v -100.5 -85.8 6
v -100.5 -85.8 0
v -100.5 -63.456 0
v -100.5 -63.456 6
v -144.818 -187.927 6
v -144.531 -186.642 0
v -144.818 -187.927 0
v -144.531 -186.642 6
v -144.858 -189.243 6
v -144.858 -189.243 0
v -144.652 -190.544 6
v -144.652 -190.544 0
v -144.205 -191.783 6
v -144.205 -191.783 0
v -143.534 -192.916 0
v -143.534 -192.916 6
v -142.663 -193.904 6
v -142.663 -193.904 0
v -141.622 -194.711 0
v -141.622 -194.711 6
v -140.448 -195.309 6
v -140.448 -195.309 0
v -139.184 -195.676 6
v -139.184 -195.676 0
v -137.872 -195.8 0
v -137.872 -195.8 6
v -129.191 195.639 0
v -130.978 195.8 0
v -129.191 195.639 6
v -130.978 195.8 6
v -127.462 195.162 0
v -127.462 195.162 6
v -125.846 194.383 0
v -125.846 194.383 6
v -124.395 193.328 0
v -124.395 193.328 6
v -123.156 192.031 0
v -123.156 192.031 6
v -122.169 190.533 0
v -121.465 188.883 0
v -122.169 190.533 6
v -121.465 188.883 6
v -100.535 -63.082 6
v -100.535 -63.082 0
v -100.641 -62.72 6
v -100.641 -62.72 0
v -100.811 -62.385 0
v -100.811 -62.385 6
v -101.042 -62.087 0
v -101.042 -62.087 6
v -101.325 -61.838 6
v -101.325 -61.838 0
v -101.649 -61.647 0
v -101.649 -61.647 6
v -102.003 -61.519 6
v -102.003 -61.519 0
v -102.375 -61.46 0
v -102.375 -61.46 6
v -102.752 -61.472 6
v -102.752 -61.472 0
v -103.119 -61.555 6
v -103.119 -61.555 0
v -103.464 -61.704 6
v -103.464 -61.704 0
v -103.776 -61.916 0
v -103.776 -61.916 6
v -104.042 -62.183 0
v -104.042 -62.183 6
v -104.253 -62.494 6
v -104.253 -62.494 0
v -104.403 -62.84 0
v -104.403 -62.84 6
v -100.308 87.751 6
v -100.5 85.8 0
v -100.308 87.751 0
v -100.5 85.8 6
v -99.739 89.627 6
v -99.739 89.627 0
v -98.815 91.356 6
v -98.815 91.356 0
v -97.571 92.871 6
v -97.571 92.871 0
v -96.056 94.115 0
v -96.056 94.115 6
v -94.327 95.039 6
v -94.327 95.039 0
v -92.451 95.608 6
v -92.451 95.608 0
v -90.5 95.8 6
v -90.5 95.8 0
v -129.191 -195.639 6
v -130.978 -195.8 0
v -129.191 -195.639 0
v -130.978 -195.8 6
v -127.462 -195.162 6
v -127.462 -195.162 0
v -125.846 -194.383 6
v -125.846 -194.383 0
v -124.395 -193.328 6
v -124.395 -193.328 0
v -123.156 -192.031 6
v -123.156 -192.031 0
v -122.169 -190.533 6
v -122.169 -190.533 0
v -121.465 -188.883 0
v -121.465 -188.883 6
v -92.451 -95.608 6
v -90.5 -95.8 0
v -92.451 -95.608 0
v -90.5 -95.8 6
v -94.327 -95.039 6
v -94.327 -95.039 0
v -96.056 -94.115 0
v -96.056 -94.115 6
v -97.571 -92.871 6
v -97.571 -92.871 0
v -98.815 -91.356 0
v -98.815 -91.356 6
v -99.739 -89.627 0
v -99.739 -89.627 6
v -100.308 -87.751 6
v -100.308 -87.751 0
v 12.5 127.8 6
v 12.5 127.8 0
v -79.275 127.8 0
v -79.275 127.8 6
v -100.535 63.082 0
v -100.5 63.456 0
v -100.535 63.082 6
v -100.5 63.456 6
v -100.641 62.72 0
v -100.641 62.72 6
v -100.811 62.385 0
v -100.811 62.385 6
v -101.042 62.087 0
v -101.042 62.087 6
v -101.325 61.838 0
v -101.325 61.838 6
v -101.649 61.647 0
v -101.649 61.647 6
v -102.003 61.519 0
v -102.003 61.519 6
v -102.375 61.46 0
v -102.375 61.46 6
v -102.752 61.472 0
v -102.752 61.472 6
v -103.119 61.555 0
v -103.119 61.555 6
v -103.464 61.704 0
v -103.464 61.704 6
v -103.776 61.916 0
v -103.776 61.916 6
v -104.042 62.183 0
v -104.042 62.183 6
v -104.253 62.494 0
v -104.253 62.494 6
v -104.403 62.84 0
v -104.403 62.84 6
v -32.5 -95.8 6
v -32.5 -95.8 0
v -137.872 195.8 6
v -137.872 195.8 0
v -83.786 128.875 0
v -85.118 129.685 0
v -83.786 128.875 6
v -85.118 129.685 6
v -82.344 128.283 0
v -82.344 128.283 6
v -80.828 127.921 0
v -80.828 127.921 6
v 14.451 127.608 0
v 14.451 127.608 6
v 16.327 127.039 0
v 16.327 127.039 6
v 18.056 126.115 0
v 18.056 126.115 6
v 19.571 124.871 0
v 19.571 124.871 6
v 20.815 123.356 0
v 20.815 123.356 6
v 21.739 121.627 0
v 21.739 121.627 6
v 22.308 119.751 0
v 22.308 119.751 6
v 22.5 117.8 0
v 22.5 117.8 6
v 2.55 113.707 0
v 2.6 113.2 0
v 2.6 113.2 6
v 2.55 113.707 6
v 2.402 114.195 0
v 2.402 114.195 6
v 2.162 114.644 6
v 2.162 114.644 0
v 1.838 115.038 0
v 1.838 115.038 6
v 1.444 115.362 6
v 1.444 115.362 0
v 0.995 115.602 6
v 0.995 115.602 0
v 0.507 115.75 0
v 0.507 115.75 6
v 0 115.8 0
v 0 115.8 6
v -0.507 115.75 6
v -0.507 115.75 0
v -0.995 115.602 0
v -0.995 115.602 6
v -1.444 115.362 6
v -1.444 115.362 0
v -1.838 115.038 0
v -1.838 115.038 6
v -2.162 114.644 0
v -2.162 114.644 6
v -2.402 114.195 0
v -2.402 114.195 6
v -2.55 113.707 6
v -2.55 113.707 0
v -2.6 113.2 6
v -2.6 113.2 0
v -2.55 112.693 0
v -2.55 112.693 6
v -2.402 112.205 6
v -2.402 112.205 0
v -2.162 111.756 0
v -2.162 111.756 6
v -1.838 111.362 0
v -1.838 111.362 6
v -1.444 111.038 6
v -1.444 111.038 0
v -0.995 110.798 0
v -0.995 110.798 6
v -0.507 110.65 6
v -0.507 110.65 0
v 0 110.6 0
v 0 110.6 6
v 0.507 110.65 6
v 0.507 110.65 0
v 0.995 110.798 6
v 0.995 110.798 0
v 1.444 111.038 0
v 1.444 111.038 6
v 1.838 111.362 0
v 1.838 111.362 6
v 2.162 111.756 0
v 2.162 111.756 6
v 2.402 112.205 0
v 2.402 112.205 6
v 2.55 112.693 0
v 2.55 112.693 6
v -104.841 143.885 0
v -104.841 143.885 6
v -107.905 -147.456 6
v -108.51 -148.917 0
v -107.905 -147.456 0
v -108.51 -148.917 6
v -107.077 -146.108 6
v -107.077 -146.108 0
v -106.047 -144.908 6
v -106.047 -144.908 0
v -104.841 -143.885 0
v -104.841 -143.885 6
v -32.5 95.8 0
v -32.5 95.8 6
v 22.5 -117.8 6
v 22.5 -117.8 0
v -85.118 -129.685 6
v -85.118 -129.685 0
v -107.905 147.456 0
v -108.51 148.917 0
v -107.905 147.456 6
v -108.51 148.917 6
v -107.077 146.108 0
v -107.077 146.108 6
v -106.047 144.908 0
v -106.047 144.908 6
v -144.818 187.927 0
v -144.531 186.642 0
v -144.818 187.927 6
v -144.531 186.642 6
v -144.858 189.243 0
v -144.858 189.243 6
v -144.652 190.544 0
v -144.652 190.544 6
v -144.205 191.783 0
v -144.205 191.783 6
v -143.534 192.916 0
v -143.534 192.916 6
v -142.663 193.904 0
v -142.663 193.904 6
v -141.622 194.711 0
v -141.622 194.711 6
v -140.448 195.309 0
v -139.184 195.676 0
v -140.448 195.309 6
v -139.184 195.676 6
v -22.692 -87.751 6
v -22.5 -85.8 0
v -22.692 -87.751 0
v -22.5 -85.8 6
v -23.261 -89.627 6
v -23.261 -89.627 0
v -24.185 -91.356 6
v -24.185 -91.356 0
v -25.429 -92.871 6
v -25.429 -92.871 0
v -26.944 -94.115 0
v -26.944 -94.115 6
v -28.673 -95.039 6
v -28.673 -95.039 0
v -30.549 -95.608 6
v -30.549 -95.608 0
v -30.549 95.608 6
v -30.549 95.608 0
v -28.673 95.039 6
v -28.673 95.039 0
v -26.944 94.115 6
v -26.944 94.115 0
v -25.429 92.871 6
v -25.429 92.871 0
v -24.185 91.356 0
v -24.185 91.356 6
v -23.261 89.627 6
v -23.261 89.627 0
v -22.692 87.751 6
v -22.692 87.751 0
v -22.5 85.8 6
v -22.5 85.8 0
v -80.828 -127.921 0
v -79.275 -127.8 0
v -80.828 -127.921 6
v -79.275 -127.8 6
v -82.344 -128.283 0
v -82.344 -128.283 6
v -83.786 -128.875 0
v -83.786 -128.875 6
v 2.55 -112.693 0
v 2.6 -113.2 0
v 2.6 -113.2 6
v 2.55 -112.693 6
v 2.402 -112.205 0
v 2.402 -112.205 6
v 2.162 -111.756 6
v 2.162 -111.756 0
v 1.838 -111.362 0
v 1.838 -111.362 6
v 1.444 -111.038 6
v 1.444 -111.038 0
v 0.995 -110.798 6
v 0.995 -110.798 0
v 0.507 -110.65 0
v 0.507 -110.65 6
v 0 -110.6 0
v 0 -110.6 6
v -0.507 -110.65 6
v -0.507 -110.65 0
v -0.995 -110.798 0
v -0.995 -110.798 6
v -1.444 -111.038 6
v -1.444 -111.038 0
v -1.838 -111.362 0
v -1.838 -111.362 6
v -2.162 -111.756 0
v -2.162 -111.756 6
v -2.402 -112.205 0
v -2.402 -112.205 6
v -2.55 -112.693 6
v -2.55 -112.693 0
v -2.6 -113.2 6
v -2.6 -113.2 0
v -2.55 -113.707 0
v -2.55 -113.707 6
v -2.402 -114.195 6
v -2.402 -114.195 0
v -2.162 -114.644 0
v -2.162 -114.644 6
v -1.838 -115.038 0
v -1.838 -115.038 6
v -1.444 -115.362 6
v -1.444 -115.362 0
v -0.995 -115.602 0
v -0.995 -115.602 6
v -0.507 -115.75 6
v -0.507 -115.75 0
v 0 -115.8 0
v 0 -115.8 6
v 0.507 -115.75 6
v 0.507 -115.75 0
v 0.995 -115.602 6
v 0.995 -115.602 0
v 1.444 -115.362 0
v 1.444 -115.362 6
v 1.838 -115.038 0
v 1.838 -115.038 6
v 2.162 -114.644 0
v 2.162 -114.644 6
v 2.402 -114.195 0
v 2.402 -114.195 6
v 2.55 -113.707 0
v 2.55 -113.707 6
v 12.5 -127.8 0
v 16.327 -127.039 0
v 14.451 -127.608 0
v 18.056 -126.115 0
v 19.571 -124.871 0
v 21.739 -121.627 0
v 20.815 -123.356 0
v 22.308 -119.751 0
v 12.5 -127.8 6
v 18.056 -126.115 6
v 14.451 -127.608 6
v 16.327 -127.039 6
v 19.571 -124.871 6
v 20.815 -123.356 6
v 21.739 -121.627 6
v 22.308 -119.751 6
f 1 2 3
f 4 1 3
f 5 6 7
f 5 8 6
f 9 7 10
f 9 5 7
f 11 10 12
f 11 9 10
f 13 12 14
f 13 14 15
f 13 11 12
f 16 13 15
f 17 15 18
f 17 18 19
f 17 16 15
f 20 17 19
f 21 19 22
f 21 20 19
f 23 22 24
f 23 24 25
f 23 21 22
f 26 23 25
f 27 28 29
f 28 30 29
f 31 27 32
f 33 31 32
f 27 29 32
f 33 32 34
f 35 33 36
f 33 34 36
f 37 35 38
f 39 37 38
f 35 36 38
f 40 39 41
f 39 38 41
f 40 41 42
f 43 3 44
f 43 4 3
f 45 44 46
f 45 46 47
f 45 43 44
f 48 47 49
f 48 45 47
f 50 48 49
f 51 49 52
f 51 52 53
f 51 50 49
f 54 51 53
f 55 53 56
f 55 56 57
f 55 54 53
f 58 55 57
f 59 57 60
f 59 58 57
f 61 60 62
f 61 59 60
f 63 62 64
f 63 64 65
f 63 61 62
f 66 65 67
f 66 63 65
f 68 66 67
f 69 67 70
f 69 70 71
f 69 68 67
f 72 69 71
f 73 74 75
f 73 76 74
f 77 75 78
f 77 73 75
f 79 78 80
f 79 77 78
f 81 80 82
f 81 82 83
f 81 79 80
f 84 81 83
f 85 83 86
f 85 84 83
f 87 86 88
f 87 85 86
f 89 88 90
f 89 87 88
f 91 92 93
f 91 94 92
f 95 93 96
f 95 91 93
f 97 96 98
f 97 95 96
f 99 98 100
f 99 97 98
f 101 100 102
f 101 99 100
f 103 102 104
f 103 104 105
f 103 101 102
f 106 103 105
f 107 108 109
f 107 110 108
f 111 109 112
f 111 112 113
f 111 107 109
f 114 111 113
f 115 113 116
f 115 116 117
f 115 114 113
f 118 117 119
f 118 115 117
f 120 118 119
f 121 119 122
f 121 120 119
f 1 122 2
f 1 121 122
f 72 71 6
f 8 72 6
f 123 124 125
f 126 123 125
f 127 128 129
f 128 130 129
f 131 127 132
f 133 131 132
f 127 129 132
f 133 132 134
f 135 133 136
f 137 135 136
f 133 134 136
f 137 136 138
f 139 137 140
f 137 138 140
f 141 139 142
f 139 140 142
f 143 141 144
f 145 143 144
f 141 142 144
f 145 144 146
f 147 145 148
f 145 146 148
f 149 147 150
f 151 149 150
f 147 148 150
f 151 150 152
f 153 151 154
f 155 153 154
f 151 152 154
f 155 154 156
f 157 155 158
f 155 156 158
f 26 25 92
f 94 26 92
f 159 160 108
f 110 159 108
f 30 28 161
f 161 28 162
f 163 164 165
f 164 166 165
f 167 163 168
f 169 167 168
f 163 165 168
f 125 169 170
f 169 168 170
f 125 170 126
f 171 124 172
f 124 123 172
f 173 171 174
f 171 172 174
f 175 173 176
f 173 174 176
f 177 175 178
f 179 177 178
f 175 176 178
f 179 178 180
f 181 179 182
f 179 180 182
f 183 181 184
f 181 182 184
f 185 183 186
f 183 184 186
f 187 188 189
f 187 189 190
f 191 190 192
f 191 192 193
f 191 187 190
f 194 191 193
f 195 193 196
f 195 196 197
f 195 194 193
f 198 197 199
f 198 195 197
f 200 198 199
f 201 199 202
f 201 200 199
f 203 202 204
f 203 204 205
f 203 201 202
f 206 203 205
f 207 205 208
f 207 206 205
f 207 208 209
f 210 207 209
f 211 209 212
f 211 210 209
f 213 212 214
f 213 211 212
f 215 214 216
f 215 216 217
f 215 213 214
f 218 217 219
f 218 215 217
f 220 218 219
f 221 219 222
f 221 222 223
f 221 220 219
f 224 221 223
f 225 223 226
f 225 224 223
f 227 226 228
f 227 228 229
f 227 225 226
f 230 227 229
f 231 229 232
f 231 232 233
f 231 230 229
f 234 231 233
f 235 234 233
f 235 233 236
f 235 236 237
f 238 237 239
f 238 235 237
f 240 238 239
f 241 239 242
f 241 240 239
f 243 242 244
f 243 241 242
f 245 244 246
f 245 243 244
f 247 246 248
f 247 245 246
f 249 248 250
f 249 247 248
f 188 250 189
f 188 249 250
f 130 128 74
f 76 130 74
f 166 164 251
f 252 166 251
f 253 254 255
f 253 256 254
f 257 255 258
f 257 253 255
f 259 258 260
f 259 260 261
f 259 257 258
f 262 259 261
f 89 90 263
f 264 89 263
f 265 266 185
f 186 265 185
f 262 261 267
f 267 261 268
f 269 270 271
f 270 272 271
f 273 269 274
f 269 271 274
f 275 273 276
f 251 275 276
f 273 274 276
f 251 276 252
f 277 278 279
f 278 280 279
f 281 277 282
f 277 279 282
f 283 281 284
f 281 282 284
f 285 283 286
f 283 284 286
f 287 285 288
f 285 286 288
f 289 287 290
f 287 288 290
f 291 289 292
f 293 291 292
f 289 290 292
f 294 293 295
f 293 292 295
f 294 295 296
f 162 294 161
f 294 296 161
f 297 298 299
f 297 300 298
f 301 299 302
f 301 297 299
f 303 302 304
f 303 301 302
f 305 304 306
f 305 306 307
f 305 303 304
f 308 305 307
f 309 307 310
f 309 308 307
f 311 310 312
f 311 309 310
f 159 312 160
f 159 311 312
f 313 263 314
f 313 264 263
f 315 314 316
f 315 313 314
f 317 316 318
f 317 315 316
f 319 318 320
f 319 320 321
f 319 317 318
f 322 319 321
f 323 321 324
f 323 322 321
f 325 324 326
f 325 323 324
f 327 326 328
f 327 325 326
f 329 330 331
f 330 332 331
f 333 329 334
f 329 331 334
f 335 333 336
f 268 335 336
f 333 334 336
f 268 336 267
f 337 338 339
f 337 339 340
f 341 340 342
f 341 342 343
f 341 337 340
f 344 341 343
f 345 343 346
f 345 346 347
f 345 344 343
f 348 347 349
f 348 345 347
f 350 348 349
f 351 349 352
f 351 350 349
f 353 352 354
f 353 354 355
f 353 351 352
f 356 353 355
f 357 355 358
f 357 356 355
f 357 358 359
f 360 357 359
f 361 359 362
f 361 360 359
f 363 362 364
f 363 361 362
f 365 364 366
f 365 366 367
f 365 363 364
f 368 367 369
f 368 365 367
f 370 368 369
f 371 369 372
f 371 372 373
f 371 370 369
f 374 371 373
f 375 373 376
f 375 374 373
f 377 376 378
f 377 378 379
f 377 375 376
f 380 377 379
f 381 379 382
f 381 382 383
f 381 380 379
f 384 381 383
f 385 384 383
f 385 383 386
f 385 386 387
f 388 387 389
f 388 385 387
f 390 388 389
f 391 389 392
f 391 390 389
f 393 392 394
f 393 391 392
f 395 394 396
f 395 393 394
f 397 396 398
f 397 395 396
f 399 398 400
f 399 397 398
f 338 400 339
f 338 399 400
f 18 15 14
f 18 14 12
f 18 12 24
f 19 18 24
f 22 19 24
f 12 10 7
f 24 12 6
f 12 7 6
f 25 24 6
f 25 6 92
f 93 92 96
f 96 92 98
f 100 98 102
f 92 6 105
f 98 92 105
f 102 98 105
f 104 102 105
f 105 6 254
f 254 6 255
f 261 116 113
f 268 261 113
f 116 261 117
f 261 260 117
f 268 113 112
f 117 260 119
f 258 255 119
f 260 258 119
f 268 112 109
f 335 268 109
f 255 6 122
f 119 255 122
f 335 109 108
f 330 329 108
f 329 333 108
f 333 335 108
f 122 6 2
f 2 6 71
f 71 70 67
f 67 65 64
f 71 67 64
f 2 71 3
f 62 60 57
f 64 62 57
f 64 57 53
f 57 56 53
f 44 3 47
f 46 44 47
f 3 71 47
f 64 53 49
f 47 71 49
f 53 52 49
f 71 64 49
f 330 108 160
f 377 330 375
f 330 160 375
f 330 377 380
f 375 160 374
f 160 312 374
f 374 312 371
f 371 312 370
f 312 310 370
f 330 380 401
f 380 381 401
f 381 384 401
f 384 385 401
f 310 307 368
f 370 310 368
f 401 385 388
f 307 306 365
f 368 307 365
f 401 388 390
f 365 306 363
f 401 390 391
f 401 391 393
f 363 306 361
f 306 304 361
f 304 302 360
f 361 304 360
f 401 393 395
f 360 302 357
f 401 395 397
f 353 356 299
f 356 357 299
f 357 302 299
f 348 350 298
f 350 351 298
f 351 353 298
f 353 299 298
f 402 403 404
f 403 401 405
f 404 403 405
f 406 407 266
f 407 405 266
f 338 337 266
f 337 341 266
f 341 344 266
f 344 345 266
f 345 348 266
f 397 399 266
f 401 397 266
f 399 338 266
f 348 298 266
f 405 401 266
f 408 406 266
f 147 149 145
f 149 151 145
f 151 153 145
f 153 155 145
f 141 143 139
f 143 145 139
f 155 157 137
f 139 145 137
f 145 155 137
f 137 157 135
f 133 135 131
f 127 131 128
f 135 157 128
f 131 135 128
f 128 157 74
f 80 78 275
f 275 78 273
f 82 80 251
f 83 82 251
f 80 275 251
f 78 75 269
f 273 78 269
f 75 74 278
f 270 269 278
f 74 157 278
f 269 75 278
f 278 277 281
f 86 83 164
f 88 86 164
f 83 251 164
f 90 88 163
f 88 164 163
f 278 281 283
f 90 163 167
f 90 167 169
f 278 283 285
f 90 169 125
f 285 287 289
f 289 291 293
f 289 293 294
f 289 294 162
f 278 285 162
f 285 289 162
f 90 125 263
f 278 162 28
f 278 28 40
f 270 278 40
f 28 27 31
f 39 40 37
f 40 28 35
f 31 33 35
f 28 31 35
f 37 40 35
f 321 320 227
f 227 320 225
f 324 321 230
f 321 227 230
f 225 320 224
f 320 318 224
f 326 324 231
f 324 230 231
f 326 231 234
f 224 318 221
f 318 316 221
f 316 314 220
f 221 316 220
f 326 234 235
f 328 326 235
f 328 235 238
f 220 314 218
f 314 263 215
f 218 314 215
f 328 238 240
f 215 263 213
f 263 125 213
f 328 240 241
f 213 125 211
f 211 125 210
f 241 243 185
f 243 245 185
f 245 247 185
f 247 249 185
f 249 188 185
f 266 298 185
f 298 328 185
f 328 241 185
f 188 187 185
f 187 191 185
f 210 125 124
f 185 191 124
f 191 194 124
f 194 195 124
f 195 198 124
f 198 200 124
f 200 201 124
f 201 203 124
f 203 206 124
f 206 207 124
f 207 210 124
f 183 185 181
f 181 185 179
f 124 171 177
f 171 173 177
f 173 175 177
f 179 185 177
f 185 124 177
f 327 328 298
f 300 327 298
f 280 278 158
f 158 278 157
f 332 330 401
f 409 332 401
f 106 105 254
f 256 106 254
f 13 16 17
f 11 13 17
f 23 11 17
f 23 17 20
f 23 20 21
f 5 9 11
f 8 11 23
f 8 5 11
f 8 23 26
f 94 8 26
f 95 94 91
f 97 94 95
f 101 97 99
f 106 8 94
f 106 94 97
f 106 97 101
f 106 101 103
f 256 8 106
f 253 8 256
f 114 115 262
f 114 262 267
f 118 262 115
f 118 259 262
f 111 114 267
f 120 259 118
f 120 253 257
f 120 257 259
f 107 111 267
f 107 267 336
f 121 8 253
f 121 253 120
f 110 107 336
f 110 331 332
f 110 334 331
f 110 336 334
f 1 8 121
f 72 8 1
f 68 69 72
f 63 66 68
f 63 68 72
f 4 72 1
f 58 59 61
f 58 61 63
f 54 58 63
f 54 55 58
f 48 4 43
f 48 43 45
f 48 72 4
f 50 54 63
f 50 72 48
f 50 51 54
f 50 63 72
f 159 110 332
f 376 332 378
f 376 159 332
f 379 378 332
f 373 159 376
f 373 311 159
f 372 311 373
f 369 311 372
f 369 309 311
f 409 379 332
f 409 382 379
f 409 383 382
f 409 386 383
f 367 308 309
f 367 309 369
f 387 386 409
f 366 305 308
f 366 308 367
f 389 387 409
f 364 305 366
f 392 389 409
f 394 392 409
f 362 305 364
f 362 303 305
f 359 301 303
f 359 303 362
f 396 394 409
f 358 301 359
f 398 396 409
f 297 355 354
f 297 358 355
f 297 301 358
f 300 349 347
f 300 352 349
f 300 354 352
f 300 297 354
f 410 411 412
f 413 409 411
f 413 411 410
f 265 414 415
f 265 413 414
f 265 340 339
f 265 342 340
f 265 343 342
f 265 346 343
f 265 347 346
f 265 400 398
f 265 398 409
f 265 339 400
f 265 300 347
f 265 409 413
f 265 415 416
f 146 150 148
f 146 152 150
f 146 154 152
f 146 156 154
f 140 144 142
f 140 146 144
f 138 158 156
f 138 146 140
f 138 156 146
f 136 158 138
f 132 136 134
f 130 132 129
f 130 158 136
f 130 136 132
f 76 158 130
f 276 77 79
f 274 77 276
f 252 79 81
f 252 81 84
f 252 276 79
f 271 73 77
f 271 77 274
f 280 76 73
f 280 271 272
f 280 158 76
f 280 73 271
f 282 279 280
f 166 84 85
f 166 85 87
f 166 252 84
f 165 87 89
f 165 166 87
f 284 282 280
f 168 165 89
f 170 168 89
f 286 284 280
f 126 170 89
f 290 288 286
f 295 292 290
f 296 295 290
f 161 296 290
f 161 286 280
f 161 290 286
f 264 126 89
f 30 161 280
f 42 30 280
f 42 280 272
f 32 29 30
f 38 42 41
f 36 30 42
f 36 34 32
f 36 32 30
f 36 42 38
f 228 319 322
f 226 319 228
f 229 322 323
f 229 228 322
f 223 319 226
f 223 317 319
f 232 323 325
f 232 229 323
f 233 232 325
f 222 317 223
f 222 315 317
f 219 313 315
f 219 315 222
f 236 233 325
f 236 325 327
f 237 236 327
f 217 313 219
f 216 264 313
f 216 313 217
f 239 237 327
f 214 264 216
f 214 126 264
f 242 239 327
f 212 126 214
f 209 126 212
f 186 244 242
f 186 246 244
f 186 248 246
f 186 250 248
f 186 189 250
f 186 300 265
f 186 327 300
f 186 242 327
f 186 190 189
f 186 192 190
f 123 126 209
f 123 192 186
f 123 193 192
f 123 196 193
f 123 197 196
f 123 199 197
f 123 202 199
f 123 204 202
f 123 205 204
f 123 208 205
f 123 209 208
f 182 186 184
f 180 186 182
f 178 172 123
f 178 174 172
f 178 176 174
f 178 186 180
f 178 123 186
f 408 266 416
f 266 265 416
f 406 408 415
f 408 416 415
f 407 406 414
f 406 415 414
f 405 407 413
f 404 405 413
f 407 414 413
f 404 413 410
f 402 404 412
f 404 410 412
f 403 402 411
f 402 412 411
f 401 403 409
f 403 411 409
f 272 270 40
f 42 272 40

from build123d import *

# Parameters (mm, degrees)
ESBO_O1_R                = 2.6
RESSALTO_EXTRUS_O1_DEPTH = 6
FILETE1_R                = 2
FILETE3_R                = 10
FILETE4_R                = 7


with BuildPart() as part:
    # Esboço1 → Ressalto-extrusão1 (new body)
    with BuildSketch(Plane.XY):
        Polygon((-100.5, 95.8), (-22.5, 95.8), (-22.5, -95.8), (-100.5, -95.8), (-100.5, -50.8), (-147.5, -195.8), (-123.706896552, -195.8), (-107.5, -145.8), (-82.5, -127.8), (22.5, -127.8), (22.5, 127.8), (-82.5, 127.8), (-107.5, 145.8), (-123.706896552, 195.8), (-147.5, 195.8), (-100.5, 50.8), align=None)
        with Locations((0, 113.2)):
            Circle(ESBO_O1_R, mode=Mode.SUBTRACT)
        with Locations((0, -113.2)):
            Circle(ESBO_O1_R, mode=Mode.SUBTRACT)
    extrude(amount=RESSALTO_EXTRUS_O1_DEPTH)

    # Filete1
    filete1_edges = [part.edges().sort_by_distance(p)[0] for p in [
        (-100.5, -50.8, 3),
        (-100.5, 50.8, 3),
    ]]
    fillet(filete1_edges, radius=FILETE1_R)

    # Filete3
    filete3_edges = [part.edges().sort_by_distance(p)[0] for p in [
        (-82.5, 127.8, 3),
        (22.5, 127.8, 3),
        (22.5, -127.8, 3),
        (-82.5, -127.8, 3),
        (-107.5, -145.8, 3),
        (-123.706896552, -195.8, 3),
        (-100.5, -95.8, 3),
        (-22.5, -95.8, 3),
        (-22.5, 95.8, 3),
        (-100.5, 95.8, 3),
        (-123.706896552, 195.8, 3),
        (-107.5, 145.8, 3),
    ]]
    fillet(filete3_edges, radius=FILETE3_R)

    # Filete4
    filete4_edges = [part.edges().sort_by_distance(p)[0] for p in [
        (-147.5, -195.8, 3),
        (-147.5, 195.8, 3),
    ]]
    fillet(filete4_edges, radius=FILETE4_R)


solid = part.part
